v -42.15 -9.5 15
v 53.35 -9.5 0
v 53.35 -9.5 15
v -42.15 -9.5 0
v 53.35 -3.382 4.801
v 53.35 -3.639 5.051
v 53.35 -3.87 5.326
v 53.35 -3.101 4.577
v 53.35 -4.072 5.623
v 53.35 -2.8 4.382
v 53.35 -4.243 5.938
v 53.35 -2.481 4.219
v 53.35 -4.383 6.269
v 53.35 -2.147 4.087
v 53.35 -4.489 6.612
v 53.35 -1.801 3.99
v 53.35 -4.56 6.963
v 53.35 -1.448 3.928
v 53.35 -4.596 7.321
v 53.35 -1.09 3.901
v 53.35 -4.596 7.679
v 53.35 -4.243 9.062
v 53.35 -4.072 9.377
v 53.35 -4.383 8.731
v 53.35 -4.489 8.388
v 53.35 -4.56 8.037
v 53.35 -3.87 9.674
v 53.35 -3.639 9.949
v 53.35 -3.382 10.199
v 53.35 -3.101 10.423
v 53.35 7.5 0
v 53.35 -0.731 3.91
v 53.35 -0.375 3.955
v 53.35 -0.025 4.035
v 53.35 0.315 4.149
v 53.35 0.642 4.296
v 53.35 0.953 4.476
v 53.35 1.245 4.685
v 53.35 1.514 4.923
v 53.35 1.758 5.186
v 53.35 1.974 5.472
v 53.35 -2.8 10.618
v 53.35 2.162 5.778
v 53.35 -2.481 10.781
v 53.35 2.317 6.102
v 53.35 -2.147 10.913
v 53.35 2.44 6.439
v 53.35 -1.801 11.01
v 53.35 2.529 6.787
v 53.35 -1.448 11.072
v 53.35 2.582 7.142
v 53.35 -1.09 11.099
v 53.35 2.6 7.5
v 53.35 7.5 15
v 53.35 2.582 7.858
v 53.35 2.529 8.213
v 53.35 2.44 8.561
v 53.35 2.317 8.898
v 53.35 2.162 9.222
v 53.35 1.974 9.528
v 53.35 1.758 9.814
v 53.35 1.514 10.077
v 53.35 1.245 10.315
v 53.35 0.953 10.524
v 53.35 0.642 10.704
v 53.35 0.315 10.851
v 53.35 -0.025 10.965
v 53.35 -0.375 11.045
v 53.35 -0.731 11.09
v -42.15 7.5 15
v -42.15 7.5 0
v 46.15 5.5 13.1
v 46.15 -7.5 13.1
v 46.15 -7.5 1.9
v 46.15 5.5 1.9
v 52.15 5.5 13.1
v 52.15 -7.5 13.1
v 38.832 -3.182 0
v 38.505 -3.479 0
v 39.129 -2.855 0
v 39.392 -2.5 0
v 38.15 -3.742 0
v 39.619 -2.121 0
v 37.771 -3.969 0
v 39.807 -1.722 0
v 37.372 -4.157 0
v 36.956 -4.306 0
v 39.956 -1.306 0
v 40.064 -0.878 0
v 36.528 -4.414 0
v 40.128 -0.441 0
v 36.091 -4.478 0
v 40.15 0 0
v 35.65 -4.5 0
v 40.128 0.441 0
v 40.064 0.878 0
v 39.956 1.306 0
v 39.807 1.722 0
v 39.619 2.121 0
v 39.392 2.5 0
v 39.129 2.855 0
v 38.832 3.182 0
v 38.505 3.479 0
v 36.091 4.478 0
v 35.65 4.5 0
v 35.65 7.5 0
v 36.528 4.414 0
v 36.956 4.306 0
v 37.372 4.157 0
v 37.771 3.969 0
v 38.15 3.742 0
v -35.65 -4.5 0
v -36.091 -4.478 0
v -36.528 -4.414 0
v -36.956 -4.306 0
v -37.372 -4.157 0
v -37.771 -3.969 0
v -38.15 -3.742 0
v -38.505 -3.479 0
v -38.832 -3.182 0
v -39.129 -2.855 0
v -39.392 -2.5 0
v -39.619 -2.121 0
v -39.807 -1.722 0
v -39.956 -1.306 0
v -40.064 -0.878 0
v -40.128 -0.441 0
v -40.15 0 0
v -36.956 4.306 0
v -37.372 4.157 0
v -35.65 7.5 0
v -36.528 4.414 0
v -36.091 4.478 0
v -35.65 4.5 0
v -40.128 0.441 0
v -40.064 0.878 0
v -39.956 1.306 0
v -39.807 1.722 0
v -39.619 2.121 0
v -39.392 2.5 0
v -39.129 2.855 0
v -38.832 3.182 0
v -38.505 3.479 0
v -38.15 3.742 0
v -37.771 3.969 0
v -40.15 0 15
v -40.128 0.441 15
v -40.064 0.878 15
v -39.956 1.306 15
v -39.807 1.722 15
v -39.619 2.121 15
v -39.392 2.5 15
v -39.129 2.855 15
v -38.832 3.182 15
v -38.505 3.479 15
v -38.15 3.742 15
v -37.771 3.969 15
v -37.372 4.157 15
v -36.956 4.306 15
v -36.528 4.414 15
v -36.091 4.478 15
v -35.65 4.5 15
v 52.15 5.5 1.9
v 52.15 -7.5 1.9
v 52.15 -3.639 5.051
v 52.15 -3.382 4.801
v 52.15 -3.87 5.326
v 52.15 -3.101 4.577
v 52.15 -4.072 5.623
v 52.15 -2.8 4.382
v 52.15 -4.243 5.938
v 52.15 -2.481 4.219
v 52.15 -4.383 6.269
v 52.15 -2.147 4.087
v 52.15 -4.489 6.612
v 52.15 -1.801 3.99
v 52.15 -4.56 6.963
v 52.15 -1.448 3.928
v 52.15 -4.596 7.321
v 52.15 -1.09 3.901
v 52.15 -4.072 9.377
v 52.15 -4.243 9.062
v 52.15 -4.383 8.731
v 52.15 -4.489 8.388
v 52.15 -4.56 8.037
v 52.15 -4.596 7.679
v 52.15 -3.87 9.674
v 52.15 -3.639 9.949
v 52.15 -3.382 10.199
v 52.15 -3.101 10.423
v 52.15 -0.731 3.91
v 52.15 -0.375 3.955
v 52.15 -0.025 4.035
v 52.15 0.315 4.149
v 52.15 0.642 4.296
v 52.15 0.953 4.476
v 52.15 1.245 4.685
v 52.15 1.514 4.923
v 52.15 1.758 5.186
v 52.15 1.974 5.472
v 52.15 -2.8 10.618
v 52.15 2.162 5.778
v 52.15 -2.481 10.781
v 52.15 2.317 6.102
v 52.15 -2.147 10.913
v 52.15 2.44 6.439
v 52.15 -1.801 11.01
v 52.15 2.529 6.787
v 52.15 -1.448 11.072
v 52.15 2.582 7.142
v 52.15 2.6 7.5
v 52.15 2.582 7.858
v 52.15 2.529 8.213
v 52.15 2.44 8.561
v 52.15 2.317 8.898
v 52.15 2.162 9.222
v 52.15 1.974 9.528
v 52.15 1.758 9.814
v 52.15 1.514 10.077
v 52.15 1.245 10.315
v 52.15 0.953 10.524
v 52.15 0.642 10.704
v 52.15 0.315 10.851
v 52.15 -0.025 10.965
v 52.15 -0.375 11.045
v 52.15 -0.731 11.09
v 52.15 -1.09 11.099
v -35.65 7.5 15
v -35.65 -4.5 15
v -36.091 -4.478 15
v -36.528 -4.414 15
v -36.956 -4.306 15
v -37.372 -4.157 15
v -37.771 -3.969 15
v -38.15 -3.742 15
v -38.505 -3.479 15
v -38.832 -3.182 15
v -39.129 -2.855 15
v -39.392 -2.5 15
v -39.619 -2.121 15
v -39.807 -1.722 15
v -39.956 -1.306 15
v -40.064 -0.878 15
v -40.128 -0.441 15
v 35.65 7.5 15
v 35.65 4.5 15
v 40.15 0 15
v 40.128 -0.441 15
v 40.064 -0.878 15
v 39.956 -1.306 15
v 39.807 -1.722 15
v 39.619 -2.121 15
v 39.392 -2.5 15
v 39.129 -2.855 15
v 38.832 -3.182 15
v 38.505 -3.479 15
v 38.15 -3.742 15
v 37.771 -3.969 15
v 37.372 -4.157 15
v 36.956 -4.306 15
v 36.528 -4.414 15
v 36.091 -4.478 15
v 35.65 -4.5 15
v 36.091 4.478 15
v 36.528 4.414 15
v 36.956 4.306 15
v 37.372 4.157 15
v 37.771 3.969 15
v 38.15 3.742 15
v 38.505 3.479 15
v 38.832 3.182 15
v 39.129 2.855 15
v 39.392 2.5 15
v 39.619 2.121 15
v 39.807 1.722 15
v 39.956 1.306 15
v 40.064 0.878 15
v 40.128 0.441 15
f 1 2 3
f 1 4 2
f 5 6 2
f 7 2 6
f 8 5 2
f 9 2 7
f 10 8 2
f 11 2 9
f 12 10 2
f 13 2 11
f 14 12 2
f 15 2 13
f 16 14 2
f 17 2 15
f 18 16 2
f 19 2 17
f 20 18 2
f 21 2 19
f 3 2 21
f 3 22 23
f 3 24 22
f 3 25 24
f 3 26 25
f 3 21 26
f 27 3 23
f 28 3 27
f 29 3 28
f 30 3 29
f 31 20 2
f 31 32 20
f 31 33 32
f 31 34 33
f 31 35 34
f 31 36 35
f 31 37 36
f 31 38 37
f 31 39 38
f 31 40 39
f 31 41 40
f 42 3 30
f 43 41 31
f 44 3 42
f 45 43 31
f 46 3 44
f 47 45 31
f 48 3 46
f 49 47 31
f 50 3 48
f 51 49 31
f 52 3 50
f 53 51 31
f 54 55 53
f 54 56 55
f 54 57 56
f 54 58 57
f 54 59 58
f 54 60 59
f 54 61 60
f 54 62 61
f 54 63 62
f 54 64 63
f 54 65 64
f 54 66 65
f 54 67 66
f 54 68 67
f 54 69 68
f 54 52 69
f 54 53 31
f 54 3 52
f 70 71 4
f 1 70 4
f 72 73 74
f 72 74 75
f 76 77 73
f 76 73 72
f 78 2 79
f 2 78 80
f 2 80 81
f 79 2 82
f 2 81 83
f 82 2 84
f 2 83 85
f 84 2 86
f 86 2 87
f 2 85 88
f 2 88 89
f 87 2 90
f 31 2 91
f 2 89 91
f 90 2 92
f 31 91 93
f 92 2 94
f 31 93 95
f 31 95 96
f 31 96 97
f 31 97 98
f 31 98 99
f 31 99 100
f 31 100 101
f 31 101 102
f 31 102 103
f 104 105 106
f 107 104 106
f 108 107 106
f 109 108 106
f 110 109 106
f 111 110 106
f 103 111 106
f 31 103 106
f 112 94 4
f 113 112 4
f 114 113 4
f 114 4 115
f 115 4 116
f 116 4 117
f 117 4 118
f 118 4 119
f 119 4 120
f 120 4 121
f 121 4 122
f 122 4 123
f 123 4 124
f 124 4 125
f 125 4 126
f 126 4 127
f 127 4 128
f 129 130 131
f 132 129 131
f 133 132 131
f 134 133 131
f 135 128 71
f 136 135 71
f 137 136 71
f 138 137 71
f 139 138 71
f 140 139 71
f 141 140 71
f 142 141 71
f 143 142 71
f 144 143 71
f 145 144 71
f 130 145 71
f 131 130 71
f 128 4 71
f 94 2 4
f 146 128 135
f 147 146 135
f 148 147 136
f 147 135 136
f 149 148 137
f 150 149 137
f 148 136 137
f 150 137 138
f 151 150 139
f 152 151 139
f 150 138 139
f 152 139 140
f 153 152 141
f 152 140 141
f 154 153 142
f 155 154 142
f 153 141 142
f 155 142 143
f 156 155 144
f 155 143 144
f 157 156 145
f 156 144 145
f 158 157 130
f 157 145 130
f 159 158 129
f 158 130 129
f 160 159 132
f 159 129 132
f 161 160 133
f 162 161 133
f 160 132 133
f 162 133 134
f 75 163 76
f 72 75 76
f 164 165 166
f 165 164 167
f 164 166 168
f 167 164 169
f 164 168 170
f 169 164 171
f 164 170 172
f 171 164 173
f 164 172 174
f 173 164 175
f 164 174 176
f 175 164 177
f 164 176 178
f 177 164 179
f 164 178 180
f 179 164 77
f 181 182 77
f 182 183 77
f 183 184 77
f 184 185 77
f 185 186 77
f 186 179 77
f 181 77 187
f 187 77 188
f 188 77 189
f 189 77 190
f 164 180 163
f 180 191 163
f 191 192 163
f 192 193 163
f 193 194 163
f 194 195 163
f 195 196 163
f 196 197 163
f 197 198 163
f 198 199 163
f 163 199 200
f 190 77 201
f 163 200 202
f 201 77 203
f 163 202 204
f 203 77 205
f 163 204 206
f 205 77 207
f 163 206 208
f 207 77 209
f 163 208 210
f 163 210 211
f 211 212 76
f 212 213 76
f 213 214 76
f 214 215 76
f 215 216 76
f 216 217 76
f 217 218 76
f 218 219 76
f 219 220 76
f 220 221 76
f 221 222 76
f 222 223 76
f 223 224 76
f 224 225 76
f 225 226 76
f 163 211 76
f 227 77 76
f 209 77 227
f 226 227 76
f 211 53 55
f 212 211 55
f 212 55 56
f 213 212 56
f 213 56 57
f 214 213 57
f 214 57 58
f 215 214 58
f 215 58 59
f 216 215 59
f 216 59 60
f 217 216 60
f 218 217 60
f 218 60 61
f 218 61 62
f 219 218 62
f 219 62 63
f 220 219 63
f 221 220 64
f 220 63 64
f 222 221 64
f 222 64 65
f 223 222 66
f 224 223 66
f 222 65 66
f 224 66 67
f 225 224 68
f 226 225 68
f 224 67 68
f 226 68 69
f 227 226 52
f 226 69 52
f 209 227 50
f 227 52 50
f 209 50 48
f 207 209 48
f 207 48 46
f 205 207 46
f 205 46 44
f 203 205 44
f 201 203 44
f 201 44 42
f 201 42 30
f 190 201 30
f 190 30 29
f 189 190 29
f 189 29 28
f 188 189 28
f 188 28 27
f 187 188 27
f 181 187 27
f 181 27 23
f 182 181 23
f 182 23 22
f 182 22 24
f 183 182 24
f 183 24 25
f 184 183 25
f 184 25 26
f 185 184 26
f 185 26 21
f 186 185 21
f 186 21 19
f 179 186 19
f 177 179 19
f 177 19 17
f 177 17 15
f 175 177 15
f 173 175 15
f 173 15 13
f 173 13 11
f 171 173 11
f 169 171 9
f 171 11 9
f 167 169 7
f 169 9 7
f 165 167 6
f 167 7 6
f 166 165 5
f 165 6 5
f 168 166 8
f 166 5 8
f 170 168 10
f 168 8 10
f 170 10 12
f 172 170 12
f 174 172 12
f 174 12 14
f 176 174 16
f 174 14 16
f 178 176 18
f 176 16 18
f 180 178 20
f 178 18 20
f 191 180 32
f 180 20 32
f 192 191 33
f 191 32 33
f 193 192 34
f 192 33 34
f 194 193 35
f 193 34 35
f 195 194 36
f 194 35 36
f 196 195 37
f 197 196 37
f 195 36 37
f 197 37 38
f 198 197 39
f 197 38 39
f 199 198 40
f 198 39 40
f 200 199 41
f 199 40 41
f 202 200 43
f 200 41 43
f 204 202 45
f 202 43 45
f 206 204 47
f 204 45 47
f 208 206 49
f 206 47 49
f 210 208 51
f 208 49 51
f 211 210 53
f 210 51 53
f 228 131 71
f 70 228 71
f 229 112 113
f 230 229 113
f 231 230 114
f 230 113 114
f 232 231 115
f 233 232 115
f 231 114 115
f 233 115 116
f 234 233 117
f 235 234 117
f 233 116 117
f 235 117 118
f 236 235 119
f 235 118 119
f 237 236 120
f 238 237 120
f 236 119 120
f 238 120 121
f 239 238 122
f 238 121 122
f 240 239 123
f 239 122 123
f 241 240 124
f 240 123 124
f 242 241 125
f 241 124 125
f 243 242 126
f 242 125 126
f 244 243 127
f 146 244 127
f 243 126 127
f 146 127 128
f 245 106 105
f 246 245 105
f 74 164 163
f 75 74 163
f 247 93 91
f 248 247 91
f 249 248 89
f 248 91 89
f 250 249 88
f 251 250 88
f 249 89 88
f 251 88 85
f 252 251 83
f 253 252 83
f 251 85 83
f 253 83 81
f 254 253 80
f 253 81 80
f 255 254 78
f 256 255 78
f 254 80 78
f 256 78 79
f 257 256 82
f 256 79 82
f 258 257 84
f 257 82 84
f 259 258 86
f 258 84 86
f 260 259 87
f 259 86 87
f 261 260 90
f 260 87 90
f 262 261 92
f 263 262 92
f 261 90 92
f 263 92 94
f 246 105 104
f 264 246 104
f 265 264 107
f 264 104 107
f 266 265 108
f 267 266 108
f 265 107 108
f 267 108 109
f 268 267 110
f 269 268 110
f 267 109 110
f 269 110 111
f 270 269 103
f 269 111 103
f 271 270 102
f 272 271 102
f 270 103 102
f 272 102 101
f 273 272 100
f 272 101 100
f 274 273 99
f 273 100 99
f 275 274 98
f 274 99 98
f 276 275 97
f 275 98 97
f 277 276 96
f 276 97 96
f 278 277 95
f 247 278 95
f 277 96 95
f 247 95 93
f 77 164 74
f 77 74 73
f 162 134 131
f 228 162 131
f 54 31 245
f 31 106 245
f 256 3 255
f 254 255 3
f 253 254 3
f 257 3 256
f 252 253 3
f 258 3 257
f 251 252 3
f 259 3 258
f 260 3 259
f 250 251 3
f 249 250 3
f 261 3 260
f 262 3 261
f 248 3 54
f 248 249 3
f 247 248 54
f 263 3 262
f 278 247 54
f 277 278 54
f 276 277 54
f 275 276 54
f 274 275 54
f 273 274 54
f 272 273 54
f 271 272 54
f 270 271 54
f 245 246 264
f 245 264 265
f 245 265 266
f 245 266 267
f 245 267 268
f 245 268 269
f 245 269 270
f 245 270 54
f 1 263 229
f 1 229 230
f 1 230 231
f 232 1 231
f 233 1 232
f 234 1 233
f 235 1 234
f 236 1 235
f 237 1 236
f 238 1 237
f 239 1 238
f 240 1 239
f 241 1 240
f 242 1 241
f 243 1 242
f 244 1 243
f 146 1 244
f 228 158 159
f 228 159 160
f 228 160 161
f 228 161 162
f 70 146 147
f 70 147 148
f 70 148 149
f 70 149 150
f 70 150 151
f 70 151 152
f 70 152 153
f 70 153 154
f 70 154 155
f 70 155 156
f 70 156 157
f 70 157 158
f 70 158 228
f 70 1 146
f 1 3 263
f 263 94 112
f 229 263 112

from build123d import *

# Parameters (mm, degrees)
F1_DEPTH = 15
F2_W     = 13
F2_H     = 11.2
F3_DEPTH = 6
F4_W     = 17
F4_H     = 15
F5_DEPTH = 1.2
F6_R     = 3.6
F7_DEPTH = 2


with BuildPart() as f1:
    # F0 (on Top) → F1 (new body)
    with BuildSketch(Plane.XY):
        with BuildLine():
            ThreePointArc((40.15, 0), (38.831981, -3.181981), (35.65, -4.5))
            Line((35.65, -4.5), (-35.65, -4.5))
            ThreePointArc((-35.65, -4.5), (-38.831981, -3.181981), (-40.15, 0))
            ThreePointArc((-40.15, 0), (-38.831981, 3.181981), (-35.65, 4.5))
            Line((-35.65, 4.5), (-35.65, 7.5))
            Line((-35.65, 7.5), (-42.15, 7.5))
            Line((-42.15, 7.5), (-42.15, -9.5))
            Line((-42.15, -9.5), (52.15, -9.5))
            Line((52.15, -9.5), (52.15, 7.5))
            Line((52.15, 7.5), (35.65, 7.5))
            Line((35.65, 7.5), (35.65, 4.5))
            ThreePointArc((35.65, 4.5), (38.831981, 3.181981), (40.15, 0))
        make_face()
    extrude(amount=F1_DEPTH)

    # F2 (on face) → F3 (cut)
    with BuildSketch(Plane.YZ.offset(52.15)):
        with Locations((-1, 7.5)):
            Rectangle(F2_W, F2_H)
    extrude(amount=-F3_DEPTH, mode=Mode.SUBTRACT)

    # F4 (on face) → F5 (join)
    with BuildSketch(Plane.YZ.offset(52.15)):
        with Locations((-1, 7.5)):
            Rectangle(F4_W, F4_H)
    extrude(amount=F5_DEPTH)

    # F6 (on face) → F7 (cut)
    with BuildSketch(Plane.YZ.offset(53.35)):
        with Locations((-1, 7.5)):
            Circle(F6_R)
    extrude(amount=-F7_DEPTH, mode=Mode.SUBTRACT)


solid = f1.part
